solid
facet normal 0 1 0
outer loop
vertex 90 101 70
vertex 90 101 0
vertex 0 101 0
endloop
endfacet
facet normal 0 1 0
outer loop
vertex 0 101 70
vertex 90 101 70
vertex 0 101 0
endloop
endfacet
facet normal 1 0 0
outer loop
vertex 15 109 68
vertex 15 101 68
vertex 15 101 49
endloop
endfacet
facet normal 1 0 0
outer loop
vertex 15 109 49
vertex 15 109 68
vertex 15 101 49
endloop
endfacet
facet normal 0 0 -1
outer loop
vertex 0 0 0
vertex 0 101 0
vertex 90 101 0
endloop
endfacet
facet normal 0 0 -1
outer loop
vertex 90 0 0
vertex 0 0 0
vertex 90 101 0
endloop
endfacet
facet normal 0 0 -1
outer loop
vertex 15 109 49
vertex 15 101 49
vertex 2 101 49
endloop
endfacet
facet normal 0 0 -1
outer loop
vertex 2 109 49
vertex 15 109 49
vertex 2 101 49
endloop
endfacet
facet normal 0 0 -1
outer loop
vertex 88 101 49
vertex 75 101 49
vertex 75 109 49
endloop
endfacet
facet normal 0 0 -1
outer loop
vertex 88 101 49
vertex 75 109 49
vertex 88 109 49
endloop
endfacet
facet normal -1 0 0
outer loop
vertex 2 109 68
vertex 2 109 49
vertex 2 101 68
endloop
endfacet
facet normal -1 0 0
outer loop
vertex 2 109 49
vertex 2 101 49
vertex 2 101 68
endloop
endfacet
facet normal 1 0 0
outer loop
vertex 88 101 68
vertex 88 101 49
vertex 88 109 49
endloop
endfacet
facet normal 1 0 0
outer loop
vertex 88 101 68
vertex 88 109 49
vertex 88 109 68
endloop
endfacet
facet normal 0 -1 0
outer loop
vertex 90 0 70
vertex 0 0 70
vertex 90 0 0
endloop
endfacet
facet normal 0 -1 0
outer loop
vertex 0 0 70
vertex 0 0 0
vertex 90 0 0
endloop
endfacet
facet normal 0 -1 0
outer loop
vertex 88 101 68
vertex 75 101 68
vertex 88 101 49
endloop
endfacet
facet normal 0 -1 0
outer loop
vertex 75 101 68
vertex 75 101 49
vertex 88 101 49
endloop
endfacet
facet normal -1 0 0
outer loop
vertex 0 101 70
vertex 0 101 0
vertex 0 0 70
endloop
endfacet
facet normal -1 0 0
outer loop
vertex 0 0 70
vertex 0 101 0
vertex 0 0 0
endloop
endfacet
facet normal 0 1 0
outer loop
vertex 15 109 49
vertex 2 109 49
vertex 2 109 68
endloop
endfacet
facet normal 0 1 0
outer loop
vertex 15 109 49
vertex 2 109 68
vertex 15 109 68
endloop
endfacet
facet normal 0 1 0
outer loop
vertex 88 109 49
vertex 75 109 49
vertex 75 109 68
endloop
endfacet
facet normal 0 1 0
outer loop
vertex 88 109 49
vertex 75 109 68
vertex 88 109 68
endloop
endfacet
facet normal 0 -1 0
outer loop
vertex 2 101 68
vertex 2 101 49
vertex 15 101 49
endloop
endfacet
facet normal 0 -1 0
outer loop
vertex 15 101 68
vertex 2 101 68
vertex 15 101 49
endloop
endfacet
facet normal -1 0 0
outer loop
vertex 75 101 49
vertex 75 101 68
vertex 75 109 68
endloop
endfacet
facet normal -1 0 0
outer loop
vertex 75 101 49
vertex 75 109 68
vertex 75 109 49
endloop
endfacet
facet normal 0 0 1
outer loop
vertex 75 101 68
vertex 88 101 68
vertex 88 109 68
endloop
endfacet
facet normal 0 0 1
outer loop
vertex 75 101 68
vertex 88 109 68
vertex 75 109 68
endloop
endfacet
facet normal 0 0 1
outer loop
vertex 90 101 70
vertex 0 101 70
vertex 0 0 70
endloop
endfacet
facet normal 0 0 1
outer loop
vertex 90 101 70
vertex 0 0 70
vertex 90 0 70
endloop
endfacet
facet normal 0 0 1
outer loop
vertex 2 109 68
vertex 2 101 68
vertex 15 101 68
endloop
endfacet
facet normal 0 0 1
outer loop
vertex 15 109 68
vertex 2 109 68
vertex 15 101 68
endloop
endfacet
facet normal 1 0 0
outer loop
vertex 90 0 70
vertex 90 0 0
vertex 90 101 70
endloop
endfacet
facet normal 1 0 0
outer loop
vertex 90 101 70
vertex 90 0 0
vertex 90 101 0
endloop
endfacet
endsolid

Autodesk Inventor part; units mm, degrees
ref_plane "YZ Plane" through (0, 0, 0) normal (1, 0, 0) x (0, 1, 0)
ref_plane "XZ Plane" through (0, 0, 0) normal (0, 1, 0) x (-1, 0, 0)
ref_plane "XY Plane" through (0, 0, 0) normal (0, 0, 1) x (1, 0, 0)
sketch "Sketch1" plane through (0, 0, 0) normal (0, 0, 1) x (1, 0, 0)
  line L0 (0, 0) -> (90, 0)
  line L1 (90, 0) -> (90, 101)
  line L2 (90, 101) -> (0, 101)
  line L3 (0, 101) -> (0, 0)
  dimension "d0" = 101
  dimension "d1" = 90
extrude "Extrusion1" add sketch "Sketch1" along normal blind 70
sketch "Sketch2" plane through (0, 101, 0) normal (0, 1, 0) x (1, 0, 0)
  line L0 (2, -68) -> (15, -68)
  line L1 (15, -68) -> (15, -49)
  line L2 (15, -49) -> (2, -49)
  line L3 (2, -49) -> (2, -68)
  line L4 (0, -70) -> (90, -70) projected
  line L5 (0, 0) -> (0, -70) projected
  dimension "d6" = 2
  dimension "d7" = 19
  dimension "d8" = 13
  dimension "d9" = 2
extrude "Extrusion2" add sketch "Sketch2" along normal blind 8 separate body
sketch "Sketch3" plane through (0, 101, 0) normal (0, 1, 0) x (1, 0, 0)
  line L0 (0, -70) -> (90, -70) projected
  line L1 (90, 0) -> (90, -70) projected
  line L2 (88, -68) -> (75, -68)
  line L3 (75, -68) -> (75, -49)
  line L4 (75, -49) -> (88, -49)
  line L5 (88, -49) -> (88, -68)
  dimension "d10" = 19
  dimension "d11" = 13
  dimension "d12" = 2
  dimension "d13" = 2
extrude "Extrusion3" add sketch "Sketch3" along normal blind 8 separate body
properties part number "TB1272-Battery"
